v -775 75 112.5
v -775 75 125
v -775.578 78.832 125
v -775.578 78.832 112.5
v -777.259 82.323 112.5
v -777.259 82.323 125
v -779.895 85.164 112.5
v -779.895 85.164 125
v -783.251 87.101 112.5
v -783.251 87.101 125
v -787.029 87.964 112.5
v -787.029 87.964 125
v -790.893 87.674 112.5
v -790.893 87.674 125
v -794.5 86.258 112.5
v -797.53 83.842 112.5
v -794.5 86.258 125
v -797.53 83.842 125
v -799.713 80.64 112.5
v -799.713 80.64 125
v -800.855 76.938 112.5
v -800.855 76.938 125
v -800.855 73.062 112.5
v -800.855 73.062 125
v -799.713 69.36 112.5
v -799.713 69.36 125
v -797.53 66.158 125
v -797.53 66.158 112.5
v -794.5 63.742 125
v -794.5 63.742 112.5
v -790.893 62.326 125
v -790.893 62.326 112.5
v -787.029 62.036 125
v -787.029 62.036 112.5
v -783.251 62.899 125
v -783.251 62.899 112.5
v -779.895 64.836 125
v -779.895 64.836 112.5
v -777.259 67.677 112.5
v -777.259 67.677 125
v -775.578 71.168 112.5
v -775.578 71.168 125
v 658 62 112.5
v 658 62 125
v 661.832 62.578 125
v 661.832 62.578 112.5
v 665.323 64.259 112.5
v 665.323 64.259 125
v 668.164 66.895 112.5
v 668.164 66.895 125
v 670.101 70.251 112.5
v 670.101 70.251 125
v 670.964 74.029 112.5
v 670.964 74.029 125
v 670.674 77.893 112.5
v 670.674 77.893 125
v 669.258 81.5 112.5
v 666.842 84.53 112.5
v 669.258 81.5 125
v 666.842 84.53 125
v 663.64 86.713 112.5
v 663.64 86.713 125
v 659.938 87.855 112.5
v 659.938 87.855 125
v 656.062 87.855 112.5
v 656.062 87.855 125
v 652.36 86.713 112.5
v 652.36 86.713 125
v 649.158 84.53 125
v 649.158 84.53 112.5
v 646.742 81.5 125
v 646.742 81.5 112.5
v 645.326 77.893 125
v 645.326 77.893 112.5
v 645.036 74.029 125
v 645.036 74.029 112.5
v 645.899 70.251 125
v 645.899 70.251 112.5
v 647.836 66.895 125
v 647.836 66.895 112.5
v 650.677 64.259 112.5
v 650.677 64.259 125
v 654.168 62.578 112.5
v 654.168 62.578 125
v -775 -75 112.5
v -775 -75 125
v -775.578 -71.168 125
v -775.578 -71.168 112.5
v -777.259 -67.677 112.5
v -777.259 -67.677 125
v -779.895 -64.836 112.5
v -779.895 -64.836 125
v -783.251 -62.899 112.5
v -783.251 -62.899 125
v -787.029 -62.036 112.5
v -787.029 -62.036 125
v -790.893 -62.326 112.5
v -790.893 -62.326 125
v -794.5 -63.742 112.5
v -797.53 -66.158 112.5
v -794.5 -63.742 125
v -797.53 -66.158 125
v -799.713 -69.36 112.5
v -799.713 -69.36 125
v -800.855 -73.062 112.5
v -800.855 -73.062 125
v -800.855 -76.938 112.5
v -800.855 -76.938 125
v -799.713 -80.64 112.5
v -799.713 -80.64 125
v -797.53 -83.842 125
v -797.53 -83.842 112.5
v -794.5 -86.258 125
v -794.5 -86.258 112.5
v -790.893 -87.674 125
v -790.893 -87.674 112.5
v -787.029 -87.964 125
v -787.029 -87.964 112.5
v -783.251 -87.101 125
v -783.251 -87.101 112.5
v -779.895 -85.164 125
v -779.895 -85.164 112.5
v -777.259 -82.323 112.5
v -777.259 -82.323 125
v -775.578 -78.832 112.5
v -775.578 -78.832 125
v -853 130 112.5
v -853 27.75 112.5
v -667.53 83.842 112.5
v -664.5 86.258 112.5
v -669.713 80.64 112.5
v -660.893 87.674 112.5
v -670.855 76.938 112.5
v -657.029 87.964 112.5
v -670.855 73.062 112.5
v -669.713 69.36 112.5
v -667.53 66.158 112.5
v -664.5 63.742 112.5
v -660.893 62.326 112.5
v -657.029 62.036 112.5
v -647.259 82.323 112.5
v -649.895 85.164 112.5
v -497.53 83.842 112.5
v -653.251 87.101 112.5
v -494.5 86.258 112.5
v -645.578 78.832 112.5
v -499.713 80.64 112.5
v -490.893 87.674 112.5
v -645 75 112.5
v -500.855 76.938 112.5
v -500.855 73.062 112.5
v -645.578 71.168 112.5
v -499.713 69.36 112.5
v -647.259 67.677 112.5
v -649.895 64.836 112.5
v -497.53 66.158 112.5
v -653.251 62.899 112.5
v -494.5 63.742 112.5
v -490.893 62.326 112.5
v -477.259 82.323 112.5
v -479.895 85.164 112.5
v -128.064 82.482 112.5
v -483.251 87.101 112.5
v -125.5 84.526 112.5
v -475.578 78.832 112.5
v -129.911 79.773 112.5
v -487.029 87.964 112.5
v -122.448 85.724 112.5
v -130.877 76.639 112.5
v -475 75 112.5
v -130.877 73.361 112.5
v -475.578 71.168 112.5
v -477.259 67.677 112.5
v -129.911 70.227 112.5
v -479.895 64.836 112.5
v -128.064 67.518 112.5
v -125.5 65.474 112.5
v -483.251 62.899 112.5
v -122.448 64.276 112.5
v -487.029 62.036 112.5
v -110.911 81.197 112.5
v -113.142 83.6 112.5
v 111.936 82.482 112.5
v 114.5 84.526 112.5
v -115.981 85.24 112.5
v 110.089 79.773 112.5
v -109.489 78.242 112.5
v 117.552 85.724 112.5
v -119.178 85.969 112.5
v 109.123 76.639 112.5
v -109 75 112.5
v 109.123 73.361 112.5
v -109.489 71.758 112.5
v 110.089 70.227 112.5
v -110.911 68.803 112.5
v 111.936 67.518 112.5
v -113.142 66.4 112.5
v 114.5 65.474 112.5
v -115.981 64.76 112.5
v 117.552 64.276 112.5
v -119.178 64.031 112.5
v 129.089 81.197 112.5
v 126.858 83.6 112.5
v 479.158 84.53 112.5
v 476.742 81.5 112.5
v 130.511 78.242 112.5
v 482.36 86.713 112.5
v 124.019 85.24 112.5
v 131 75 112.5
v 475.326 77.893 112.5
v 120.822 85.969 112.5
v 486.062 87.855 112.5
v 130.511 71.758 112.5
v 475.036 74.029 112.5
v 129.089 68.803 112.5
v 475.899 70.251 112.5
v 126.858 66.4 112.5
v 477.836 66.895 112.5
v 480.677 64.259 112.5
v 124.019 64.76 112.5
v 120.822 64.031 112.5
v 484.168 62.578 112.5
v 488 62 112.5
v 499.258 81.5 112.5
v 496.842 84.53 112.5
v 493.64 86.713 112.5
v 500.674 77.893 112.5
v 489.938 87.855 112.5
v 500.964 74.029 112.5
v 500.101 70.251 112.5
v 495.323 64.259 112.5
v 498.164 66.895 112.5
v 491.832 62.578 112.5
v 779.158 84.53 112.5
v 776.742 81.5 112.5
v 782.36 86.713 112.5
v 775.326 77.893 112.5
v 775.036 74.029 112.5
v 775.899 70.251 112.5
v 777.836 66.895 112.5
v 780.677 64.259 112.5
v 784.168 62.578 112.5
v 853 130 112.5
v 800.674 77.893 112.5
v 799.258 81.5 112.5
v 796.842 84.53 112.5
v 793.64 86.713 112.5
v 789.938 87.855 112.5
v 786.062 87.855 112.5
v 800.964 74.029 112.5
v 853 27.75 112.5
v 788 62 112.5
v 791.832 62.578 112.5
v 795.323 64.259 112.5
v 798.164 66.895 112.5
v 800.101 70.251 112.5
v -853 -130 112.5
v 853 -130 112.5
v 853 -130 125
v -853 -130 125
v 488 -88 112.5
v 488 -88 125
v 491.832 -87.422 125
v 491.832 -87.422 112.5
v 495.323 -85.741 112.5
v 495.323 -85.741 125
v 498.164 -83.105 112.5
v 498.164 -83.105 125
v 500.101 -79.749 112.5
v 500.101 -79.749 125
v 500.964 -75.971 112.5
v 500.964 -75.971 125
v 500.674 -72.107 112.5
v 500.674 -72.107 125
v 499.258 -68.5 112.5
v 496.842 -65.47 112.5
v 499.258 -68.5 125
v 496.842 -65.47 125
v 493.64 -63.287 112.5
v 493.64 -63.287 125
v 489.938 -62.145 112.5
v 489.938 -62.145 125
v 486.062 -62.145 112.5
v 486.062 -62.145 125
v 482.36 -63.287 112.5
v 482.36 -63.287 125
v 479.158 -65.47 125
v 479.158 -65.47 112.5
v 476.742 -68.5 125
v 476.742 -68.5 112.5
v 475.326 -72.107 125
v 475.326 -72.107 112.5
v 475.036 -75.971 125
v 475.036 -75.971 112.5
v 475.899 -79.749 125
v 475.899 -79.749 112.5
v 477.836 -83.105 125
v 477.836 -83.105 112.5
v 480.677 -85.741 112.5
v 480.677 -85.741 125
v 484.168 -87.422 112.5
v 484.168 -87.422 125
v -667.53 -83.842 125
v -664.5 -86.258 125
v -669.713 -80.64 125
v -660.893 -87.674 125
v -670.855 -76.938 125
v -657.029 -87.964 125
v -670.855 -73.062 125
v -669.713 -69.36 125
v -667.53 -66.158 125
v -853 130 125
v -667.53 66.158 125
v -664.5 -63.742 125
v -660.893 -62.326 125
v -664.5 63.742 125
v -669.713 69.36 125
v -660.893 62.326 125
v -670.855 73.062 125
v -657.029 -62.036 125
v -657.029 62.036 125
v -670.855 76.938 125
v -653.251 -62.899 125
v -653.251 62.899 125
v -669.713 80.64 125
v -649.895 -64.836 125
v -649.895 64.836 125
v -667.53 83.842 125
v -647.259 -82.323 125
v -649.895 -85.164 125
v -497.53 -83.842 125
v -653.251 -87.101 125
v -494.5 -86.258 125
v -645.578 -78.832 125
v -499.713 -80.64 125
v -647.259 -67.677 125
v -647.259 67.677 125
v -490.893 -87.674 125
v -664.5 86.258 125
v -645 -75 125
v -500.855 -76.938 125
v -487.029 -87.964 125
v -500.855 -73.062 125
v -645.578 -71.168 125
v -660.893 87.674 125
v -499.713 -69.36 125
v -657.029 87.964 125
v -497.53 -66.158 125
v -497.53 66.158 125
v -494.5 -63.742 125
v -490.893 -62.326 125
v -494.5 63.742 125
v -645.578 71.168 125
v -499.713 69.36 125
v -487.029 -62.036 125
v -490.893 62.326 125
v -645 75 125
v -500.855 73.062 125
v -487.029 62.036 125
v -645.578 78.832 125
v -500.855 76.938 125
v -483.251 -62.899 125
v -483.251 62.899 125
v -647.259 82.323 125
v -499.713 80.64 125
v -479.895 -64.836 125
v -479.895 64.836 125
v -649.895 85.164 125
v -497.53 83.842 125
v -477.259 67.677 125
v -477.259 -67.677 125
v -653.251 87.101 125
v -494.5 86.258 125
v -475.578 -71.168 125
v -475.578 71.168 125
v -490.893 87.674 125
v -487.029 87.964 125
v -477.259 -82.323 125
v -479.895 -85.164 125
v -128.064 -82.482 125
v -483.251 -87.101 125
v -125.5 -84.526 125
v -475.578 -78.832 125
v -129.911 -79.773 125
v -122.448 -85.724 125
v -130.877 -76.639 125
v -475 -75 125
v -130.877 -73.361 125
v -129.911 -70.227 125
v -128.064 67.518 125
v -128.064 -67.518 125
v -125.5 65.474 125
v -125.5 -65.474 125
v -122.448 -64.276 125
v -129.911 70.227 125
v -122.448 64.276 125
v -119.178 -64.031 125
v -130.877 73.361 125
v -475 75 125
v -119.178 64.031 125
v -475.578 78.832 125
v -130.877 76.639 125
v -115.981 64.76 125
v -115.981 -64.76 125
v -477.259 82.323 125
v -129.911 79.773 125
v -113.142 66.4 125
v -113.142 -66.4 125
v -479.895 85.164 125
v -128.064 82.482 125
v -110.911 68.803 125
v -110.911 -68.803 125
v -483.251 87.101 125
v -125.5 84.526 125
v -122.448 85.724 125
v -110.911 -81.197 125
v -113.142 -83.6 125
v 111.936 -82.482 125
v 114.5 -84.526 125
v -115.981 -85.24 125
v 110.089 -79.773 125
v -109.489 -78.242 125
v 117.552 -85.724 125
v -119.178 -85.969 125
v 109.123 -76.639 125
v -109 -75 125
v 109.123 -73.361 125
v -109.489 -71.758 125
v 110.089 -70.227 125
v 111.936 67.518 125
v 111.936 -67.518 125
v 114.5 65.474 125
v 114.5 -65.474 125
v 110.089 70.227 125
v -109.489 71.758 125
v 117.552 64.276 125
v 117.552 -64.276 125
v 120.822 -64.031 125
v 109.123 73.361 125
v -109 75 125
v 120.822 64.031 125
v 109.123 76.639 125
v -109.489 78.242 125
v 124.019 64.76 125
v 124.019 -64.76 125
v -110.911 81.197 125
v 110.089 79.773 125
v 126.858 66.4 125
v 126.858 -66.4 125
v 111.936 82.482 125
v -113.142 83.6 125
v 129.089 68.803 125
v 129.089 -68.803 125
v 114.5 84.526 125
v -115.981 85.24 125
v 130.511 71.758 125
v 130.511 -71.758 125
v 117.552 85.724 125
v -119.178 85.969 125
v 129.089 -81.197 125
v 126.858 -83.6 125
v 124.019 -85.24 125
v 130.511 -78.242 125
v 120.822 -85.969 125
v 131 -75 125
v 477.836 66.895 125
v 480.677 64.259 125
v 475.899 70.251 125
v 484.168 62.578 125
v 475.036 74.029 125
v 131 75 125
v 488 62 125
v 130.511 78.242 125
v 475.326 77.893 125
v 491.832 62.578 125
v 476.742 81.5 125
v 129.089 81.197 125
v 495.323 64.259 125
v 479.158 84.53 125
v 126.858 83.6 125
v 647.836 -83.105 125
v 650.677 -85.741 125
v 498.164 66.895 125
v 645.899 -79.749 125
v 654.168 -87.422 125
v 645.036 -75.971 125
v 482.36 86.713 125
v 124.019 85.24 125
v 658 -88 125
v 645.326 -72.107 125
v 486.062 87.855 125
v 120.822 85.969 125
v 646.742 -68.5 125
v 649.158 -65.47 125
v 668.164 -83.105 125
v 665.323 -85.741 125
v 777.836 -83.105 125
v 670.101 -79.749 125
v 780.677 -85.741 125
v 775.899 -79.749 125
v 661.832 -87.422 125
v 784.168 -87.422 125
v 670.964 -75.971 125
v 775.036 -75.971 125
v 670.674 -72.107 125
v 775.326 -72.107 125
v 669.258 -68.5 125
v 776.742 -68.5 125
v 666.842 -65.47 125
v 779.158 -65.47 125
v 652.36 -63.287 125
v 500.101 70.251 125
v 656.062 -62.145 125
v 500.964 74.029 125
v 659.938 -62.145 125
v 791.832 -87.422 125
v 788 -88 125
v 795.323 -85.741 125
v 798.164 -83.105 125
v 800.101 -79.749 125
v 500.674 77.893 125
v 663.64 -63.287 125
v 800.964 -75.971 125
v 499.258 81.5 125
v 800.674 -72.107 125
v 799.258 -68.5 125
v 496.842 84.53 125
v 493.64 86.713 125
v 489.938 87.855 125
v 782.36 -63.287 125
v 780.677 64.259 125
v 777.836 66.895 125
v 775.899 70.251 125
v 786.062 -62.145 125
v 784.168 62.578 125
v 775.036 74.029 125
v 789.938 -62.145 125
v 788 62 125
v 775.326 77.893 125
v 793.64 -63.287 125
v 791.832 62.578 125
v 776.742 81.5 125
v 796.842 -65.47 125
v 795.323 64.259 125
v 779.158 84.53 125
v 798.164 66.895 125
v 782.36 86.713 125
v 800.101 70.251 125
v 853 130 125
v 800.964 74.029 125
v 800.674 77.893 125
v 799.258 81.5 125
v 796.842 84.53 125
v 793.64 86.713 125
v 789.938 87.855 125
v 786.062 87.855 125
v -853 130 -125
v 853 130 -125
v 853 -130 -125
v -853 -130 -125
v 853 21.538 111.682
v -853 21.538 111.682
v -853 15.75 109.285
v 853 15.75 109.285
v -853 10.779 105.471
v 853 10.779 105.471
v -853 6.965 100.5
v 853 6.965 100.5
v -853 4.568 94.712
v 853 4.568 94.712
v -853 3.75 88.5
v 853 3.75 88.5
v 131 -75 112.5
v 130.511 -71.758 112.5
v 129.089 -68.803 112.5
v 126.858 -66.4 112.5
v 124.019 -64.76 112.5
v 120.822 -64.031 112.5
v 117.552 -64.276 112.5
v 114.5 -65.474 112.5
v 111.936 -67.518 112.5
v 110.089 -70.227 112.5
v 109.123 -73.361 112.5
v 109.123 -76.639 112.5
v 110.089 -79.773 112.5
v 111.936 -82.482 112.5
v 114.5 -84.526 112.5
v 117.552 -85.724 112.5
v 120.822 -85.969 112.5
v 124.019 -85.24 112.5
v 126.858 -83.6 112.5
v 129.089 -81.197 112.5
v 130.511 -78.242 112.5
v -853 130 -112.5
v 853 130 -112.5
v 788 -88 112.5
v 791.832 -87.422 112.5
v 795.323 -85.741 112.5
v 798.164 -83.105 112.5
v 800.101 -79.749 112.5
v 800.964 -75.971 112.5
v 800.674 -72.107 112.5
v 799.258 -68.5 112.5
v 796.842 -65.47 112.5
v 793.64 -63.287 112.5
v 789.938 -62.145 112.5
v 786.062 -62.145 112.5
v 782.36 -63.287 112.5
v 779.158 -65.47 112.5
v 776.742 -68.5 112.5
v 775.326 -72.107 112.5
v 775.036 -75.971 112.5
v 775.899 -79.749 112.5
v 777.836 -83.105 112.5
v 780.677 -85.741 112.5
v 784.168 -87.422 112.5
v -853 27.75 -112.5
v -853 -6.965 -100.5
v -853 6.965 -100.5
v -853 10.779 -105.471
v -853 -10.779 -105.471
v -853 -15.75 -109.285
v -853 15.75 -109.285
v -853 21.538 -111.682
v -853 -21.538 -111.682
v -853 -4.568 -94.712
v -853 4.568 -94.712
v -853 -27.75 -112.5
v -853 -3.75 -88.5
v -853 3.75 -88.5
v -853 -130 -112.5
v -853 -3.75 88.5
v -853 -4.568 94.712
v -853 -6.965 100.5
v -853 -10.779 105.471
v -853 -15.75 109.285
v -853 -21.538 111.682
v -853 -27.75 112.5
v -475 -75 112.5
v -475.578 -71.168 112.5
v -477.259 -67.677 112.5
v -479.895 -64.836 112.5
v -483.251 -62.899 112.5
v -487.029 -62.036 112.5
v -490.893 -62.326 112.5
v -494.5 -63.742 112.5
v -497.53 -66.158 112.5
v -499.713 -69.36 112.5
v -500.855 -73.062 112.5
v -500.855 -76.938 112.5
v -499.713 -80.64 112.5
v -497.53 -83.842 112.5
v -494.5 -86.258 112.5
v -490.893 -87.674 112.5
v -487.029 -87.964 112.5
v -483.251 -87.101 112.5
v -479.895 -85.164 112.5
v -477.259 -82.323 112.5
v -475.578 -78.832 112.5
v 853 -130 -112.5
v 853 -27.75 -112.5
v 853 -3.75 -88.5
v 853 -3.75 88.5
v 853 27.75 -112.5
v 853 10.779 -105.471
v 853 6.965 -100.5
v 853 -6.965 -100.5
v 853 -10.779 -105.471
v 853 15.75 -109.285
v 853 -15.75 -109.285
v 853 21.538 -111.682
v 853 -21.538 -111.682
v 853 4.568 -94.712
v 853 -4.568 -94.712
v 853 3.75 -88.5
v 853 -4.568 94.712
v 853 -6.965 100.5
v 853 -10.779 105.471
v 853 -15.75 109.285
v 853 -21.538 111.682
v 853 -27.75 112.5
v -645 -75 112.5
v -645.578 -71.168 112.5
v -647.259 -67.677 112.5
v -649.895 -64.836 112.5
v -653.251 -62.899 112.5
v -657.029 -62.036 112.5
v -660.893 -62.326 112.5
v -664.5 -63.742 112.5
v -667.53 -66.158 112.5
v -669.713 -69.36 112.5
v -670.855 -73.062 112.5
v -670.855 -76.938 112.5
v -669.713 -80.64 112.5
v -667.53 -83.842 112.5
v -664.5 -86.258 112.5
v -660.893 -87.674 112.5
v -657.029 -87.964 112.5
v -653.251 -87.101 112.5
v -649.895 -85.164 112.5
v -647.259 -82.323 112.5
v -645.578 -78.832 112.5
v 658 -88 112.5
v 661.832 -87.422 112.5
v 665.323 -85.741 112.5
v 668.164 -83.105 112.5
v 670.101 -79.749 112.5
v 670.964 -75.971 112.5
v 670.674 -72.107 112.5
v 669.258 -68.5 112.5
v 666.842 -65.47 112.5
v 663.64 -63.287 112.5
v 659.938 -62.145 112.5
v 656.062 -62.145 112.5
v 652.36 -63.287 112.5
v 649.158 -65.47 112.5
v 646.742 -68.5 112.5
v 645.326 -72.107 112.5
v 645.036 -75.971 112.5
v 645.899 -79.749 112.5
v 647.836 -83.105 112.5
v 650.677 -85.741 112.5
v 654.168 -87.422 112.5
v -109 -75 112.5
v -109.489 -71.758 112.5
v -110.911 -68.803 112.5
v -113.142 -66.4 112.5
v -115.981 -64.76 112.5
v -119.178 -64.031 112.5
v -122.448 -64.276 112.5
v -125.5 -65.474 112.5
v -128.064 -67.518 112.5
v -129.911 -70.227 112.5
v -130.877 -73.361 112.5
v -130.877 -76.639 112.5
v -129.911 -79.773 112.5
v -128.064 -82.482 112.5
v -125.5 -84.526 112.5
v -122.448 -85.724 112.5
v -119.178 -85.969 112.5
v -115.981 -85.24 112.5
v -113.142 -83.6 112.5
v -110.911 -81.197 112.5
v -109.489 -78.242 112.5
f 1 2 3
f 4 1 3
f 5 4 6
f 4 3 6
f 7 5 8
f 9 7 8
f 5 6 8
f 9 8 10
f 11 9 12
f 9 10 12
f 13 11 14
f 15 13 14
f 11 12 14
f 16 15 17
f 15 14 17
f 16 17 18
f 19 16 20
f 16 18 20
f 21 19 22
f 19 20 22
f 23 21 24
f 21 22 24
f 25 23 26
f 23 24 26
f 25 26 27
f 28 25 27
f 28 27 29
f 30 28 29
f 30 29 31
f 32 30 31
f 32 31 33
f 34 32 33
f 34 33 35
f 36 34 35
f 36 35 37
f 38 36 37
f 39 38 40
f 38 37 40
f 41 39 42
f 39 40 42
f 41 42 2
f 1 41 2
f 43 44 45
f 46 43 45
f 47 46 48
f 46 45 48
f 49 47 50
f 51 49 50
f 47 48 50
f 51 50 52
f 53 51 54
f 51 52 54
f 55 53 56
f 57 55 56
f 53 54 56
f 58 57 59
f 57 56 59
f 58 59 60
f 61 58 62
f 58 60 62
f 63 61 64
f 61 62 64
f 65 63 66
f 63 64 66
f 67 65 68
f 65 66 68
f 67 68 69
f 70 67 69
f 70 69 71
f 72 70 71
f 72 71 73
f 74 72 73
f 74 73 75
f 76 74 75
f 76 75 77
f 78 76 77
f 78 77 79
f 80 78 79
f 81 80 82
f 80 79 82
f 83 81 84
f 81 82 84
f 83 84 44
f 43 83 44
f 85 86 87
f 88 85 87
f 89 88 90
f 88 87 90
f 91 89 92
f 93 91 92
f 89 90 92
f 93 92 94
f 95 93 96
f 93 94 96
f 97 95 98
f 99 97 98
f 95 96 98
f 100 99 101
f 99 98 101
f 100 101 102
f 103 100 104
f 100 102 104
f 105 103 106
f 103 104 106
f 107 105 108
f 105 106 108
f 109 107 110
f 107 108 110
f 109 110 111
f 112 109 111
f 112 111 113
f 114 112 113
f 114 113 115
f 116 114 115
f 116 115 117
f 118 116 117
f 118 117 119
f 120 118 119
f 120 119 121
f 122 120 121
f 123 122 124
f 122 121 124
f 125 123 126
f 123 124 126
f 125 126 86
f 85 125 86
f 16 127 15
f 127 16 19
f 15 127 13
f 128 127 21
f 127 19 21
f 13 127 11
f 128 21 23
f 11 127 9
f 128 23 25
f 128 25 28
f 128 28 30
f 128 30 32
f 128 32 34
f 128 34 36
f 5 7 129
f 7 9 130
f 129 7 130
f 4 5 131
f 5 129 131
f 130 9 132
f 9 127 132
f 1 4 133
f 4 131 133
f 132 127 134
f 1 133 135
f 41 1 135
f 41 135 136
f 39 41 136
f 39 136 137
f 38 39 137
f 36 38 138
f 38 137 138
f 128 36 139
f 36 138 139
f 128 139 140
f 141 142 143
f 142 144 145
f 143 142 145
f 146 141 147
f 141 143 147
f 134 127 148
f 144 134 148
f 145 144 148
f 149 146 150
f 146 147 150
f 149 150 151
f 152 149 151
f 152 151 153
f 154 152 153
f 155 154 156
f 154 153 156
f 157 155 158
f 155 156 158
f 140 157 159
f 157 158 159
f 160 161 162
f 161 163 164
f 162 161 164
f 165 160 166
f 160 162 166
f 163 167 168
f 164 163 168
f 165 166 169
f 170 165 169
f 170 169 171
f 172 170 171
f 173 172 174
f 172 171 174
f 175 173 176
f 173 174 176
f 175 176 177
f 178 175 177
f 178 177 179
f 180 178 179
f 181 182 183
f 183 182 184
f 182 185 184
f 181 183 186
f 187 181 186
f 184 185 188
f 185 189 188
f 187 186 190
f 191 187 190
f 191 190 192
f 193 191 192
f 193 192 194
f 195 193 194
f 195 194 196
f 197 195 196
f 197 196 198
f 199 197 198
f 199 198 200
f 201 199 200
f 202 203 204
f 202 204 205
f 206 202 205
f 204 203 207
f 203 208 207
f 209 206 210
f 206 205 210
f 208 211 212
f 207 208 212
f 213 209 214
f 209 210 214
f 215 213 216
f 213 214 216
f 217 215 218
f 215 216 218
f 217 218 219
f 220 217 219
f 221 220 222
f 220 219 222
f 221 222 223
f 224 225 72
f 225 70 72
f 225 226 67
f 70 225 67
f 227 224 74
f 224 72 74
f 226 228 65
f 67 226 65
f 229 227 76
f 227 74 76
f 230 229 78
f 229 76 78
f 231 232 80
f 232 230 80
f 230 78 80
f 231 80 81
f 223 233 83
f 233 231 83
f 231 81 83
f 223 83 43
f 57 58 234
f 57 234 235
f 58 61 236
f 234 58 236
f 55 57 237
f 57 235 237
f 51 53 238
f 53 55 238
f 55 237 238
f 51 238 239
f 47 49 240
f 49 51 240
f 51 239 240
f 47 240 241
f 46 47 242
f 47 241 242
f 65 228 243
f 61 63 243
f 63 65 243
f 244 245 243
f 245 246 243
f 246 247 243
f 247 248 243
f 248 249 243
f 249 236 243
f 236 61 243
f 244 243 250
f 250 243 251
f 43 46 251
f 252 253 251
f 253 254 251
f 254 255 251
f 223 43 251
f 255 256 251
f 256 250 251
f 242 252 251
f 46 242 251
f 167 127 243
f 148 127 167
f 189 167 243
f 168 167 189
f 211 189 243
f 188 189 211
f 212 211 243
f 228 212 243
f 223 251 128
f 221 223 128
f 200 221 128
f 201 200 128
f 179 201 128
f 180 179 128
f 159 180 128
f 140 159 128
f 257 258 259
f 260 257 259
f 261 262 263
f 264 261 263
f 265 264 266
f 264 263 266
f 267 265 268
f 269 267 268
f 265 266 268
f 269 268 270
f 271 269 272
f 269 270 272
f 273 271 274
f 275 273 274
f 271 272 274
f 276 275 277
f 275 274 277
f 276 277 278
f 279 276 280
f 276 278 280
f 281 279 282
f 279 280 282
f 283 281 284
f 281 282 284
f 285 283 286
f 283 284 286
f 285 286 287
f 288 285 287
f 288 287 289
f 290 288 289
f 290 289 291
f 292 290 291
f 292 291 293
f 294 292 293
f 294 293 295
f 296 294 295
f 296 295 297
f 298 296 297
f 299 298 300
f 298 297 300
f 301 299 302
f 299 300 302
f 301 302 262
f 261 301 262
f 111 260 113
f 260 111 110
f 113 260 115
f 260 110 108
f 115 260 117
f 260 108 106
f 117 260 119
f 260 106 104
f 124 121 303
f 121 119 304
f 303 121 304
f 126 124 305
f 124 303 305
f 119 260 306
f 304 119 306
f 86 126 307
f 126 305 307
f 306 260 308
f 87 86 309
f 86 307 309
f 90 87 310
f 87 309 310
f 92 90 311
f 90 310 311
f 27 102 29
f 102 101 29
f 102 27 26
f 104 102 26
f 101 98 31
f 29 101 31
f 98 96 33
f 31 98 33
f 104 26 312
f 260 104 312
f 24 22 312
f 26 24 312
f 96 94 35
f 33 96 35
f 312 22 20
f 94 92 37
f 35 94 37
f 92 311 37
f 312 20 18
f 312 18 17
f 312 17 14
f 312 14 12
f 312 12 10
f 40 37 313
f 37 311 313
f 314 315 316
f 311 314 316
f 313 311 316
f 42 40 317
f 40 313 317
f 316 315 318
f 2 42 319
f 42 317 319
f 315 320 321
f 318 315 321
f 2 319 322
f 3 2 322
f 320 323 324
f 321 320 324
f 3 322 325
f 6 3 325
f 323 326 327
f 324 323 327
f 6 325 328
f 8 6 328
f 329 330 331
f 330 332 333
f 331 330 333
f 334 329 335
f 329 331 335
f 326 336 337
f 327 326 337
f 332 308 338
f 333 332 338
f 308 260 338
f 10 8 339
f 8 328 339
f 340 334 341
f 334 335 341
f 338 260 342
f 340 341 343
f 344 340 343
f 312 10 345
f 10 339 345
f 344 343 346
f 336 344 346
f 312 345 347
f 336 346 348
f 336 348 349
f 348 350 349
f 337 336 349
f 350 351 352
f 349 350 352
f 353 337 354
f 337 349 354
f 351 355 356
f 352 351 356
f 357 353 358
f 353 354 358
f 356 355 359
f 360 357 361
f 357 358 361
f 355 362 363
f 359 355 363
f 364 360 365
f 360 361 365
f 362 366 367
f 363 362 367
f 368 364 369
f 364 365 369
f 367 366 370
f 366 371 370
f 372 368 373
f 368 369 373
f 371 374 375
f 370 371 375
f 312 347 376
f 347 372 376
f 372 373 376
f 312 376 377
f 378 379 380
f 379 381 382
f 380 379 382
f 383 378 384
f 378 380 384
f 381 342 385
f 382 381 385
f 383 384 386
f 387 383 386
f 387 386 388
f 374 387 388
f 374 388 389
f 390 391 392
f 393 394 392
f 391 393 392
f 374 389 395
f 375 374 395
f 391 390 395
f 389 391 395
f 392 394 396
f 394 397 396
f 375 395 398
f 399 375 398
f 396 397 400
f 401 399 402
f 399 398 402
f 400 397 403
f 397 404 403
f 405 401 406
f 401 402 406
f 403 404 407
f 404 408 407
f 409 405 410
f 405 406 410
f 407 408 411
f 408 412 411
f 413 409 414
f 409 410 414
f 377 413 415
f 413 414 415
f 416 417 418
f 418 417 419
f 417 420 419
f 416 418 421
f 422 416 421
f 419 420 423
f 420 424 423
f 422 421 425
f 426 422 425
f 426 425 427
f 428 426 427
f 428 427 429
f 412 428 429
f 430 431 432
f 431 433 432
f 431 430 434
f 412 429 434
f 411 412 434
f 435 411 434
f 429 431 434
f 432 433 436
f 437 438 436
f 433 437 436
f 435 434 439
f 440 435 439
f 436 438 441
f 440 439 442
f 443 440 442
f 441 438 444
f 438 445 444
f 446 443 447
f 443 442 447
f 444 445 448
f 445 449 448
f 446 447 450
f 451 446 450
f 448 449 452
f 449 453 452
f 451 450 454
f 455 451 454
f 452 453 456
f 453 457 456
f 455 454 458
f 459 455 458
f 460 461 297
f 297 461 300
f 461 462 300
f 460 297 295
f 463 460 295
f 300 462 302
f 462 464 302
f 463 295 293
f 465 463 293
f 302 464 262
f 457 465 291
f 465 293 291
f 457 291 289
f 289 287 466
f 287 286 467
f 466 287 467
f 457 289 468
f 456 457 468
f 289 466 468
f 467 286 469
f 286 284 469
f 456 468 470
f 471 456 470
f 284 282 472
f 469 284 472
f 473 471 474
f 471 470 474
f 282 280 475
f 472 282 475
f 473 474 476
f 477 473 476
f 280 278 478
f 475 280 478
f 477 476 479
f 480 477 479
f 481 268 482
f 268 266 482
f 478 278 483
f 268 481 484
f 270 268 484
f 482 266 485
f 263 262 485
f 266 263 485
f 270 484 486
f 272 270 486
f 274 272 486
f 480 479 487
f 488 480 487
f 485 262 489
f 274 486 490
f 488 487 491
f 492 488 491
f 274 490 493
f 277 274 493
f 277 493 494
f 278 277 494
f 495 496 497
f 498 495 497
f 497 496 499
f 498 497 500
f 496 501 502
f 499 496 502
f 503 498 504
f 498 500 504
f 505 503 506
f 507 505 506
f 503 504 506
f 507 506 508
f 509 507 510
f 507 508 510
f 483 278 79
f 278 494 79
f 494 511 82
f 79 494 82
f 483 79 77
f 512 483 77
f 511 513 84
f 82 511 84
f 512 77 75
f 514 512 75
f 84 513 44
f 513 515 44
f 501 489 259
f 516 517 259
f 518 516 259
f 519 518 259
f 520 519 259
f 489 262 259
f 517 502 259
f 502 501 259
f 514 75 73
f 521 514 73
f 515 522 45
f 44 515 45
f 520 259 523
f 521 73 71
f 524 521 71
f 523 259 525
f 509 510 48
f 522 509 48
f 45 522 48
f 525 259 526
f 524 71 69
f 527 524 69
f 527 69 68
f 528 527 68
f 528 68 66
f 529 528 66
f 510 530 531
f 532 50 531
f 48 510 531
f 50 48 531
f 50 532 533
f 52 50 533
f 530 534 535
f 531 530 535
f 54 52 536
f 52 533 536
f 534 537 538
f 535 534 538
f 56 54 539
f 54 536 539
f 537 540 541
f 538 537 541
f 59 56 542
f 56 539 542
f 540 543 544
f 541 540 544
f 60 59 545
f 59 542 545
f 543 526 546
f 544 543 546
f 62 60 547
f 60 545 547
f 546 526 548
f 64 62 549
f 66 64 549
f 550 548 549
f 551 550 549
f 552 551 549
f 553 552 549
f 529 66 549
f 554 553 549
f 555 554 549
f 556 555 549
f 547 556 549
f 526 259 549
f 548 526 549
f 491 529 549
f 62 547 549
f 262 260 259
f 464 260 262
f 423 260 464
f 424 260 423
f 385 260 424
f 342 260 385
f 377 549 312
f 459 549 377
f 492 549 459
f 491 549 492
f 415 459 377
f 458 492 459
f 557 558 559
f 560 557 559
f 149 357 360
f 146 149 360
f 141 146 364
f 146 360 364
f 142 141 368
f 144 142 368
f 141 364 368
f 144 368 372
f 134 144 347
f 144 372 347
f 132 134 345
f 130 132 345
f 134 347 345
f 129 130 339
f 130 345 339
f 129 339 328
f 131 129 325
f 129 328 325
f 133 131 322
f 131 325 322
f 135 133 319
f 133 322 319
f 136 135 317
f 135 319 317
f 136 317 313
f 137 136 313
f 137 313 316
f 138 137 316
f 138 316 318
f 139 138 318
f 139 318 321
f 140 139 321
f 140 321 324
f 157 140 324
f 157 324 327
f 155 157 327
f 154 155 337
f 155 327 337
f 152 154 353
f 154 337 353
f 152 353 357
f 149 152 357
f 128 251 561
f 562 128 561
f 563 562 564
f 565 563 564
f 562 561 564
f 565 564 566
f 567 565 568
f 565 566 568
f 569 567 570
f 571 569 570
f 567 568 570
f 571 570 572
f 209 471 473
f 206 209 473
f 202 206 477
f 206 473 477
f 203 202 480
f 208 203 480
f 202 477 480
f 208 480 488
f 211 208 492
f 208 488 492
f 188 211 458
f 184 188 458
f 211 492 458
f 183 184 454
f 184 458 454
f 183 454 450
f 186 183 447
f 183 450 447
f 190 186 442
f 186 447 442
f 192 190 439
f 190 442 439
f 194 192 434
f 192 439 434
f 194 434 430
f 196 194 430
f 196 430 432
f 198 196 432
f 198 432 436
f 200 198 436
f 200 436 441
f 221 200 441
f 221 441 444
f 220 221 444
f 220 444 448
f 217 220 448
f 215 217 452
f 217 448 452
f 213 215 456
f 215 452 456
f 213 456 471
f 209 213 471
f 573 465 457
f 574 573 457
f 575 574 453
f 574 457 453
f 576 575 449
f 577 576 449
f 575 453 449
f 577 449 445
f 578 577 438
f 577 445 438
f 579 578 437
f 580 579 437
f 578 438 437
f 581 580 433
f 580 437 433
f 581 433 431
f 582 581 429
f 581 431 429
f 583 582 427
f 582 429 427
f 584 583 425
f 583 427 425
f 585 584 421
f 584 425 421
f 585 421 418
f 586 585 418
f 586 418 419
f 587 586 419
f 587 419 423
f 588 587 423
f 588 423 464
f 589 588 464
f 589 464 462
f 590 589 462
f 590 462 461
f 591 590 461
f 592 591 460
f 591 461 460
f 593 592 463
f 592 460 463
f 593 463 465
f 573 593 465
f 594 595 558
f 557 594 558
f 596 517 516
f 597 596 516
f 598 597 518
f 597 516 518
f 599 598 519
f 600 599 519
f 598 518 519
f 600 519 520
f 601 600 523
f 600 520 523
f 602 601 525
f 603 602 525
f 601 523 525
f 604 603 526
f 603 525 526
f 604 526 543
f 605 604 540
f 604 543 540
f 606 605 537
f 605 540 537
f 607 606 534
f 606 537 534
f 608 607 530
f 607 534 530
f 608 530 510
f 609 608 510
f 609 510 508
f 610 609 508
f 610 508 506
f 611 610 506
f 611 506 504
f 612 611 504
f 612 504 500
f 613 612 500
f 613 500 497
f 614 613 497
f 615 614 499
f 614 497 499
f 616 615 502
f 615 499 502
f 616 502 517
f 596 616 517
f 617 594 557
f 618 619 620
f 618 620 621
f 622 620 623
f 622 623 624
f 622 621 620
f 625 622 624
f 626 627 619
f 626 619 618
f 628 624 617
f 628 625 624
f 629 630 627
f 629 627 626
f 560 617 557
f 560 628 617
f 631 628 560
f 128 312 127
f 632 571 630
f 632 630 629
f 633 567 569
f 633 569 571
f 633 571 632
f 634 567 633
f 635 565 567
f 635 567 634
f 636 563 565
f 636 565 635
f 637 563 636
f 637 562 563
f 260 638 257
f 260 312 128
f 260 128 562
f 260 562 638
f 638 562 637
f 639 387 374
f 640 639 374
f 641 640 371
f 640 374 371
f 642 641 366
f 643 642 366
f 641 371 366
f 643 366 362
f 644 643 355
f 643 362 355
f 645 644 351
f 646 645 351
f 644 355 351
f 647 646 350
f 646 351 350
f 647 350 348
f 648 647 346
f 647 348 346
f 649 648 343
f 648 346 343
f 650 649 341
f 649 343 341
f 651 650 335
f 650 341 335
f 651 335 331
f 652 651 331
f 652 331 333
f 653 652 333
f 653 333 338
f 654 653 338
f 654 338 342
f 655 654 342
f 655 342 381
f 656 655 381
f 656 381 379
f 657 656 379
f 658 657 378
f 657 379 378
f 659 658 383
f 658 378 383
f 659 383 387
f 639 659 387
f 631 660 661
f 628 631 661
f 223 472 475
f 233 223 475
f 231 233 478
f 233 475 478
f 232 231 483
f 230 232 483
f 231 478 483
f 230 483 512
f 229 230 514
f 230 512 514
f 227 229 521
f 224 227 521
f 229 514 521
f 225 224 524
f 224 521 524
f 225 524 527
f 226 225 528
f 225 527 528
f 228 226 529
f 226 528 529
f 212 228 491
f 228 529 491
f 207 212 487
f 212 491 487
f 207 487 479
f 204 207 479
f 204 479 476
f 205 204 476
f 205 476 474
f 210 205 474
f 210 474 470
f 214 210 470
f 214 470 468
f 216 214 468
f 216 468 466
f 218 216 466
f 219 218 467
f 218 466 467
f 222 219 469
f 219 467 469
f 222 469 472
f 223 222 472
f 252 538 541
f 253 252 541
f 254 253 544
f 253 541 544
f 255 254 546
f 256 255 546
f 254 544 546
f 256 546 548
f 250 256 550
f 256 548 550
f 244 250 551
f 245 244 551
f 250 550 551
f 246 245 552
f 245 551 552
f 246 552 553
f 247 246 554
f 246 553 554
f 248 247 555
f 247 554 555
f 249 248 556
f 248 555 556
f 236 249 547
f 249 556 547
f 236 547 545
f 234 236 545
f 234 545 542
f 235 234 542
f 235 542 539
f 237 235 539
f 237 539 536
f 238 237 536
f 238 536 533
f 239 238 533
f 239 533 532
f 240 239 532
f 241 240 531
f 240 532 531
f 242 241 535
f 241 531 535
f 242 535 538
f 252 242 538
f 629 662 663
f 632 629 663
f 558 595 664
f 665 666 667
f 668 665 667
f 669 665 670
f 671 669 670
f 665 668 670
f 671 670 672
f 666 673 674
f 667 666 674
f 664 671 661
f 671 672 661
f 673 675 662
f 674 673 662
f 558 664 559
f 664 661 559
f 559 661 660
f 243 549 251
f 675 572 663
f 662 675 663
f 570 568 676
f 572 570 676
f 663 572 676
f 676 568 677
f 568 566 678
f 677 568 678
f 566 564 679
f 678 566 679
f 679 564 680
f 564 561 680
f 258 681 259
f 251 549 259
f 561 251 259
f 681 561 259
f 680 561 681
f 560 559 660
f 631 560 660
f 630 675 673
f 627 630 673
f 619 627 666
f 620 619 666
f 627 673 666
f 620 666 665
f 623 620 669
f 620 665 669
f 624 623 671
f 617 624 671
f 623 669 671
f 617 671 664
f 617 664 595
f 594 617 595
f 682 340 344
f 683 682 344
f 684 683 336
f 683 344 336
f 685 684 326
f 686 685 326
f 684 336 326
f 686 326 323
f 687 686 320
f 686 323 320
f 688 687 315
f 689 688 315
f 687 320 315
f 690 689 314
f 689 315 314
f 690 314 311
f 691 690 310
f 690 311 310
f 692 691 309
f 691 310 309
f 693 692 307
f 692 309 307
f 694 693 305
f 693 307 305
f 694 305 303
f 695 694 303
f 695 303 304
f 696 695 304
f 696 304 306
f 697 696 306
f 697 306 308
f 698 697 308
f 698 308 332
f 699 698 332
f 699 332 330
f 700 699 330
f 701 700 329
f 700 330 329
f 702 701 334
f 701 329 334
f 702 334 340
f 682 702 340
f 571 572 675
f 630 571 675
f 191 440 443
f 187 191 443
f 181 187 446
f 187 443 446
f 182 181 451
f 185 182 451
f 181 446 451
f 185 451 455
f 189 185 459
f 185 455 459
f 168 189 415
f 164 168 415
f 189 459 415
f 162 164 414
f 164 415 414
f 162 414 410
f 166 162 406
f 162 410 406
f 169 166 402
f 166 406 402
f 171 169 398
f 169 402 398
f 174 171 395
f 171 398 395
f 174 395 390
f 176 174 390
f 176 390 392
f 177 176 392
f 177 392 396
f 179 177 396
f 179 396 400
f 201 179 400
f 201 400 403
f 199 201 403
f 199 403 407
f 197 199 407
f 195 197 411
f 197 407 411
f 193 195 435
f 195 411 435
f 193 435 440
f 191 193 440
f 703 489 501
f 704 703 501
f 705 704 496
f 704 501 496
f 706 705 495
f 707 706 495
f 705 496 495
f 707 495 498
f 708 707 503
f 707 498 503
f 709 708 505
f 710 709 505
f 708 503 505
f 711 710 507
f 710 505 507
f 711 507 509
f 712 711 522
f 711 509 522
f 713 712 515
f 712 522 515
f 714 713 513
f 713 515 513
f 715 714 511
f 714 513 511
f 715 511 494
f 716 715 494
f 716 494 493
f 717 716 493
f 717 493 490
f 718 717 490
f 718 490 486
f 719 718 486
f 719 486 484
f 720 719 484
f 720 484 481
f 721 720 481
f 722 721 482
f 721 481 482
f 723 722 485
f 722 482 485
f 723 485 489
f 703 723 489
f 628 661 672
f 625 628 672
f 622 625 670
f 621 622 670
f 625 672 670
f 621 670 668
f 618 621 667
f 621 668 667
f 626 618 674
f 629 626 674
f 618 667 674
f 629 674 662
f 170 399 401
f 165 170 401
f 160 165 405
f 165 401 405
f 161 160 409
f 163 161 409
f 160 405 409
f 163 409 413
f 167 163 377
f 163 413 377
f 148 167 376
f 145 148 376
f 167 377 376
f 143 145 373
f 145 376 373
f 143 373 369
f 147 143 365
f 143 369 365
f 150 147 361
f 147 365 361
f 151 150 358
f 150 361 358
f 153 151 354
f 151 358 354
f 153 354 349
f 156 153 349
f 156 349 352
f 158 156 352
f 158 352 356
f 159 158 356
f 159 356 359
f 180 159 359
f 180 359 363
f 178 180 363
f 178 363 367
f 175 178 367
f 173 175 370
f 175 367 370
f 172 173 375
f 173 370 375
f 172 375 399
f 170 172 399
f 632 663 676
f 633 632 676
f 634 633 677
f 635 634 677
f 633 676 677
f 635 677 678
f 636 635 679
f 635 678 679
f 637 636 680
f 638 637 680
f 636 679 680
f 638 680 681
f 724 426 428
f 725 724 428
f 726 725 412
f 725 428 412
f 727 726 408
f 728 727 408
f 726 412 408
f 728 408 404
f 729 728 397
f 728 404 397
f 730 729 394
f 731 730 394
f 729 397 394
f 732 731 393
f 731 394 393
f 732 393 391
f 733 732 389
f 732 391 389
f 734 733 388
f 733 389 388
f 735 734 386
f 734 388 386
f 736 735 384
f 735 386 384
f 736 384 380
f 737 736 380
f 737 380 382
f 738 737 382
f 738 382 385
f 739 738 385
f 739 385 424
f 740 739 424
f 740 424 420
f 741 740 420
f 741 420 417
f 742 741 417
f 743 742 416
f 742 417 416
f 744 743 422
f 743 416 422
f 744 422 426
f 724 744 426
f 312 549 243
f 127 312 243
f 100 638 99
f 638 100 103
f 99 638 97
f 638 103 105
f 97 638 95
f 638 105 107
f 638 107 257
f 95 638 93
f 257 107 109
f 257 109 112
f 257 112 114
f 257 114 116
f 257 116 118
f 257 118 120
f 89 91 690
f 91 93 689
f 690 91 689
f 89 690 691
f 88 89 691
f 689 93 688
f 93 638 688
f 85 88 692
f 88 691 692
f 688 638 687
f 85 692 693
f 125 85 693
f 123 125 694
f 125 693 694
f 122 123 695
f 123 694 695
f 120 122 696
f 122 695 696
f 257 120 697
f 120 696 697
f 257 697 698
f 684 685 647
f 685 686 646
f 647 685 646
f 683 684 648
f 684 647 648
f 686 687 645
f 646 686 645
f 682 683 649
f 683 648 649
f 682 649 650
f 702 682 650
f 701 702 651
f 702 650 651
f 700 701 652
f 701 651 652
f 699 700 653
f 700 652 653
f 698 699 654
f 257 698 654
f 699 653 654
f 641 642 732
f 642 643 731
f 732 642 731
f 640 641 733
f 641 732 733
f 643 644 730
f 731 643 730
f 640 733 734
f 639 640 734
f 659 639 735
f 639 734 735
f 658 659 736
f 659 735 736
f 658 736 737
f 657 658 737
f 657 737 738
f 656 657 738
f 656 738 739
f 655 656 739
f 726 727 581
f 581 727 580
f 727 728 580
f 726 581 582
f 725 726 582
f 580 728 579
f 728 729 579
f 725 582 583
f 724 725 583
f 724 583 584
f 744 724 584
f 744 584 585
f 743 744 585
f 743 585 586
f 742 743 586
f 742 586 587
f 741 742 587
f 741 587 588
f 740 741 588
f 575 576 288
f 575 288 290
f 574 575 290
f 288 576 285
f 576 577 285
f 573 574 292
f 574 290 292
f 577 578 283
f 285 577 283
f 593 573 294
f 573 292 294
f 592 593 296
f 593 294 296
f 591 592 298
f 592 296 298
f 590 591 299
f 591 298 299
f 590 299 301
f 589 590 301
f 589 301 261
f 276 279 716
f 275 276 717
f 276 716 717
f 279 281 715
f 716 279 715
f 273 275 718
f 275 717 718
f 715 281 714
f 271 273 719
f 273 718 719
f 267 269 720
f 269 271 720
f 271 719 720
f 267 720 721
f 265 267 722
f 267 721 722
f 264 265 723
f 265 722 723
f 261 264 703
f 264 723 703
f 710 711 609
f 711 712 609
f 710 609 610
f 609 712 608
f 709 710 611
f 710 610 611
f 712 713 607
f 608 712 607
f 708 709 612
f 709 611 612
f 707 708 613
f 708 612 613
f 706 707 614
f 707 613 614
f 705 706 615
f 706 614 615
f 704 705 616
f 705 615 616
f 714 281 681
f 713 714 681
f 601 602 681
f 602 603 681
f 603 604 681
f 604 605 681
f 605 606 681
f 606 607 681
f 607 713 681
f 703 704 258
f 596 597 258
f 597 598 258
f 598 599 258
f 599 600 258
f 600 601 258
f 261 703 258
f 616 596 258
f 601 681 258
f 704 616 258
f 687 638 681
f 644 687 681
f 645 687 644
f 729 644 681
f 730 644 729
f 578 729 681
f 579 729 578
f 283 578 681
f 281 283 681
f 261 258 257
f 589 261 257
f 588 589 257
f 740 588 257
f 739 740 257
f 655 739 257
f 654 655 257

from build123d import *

# Parameters (mm, degrees)
STRUKTURBAUTEIL1_DEPTH          = 1706
SKIZZE2_R                       = 13
SKIZZE2_R_2                     = 11
SCHNITT_LINEAR_AUSTRAGEN1_DEPTH = 12.5


with BuildPart() as part:
    # Skizze12 → Strukturbauteil1 (new body)
    with BuildSketch(Plane(origin=(853, 0, 0), x_dir=(0, -1, 0), z_dir=(-1, 0, 0))):
        with BuildLine():
            Line((130, 125), (-130, 125))
            Line((-130, 125), (-130, 112.5))
            Line((-130, 112.5), (-27.75, 112.5))
            ThreePointArc((-27.75, 112.5), (-10.779437252, 105.470562748), (-3.75, 88.5))
            Line((-3.75, 88.5), (-3.75, -88.5))
            ThreePointArc((-3.75, -88.5), (-10.779437252, -105.470562748), (-27.75, -112.5))
            Line((-27.75, -112.5), (-130, -112.5))
            Line((-130, -112.5), (-130, -125))
            Line((-130, -125), (130, -125))
            Line((130, -125), (130, -112.5))
            Line((130, -112.5), (27.75, -112.5))
            ThreePointArc((27.75, -112.5), (10.779437252, -105.470562748), (3.75, -88.5))
            Line((3.75, -88.5), (3.75, 88.5))
            ThreePointArc((3.75, 88.5), (10.779437252, 105.470562748), (27.75, 112.5))
            Line((27.75, 112.5), (130, 112.5))
            Line((130, 112.5), (130, 125))
        make_face()
    extrude(amount=STRUKTURBAUTEIL1_DEPTH)

    # Skizze2 → Schnitt-Linear austragen1 (cut)
    with BuildSketch(Plane.XY.offset(125)):
        with Locations((-788, 75)):
            Circle(SKIZZE2_R)
        with Locations((-788, -75)):
            Circle(SKIZZE2_R)
        with Locations((-658, -75)):
            Circle(SKIZZE2_R)
        with Locations((-658, 75)):
            Circle(SKIZZE2_R)
        with Locations((-488, 75)):
            Circle(SKIZZE2_R)
        with Locations((-488, -75)):
            Circle(SKIZZE2_R)
        with Locations(Location((488, -75, 0), (0, 0, 270))):  # turned: the seam where the file's is
            Circle(SKIZZE2_R)
        with Locations(Location((488, 75, 0), (0, 0, 270))):  # turned: the seam where the file's is
            Circle(SKIZZE2_R)
        with Locations(Location((658, 75, 0), (0, 0, 270))):  # turned: the seam where the file's is
            Circle(SKIZZE2_R)
        with Locations(Location((658, -75, 0), (0, 0, 270))):  # turned: the seam where the file's is
            Circle(SKIZZE2_R)
        with Locations(Location((788, -75, 0), (0, 0, 270))):  # turned: the seam where the file's is
            Circle(SKIZZE2_R)
        with Locations(Location((788, 75, 0), (0, 0, 270))):  # turned: the seam where the file's is
            Circle(SKIZZE2_R)
        with Locations((-120, 75)):
            Circle(SKIZZE2_R_2)
        with Locations((120, 75)):
            Circle(SKIZZE2_R_2)
        with Locations((-120, -75)):
            Circle(SKIZZE2_R_2)
        with Locations((120, -75)):
            Circle(SKIZZE2_R_2)
    extrude(amount=-SCHNITT_LINEAR_AUSTRAGEN1_DEPTH, mode=Mode.SUBTRACT)


solid = part.part
